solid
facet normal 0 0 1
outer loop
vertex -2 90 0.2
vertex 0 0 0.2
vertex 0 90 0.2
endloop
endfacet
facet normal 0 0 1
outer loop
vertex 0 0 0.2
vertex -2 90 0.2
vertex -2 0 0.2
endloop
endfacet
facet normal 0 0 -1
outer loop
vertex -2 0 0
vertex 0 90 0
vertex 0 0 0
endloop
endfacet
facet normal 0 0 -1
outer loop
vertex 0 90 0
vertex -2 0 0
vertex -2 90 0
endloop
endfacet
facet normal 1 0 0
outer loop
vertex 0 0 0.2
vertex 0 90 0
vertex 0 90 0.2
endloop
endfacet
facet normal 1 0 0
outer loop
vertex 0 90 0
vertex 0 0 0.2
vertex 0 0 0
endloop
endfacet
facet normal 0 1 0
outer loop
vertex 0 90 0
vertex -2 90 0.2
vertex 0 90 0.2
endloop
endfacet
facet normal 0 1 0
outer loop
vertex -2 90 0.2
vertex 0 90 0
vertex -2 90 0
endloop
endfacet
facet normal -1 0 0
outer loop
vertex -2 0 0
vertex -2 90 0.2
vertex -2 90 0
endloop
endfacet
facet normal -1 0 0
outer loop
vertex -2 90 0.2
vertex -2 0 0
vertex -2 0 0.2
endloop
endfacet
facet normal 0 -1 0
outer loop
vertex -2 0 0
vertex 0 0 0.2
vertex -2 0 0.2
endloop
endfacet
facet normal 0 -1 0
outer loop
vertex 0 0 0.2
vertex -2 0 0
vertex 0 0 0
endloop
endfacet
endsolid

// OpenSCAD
module purge_line() {
   cube([90,2,0.2]);
}
dirx = 0;
rotate([0,0,dirx == 1 ? 0 : 90])
purge_line();
